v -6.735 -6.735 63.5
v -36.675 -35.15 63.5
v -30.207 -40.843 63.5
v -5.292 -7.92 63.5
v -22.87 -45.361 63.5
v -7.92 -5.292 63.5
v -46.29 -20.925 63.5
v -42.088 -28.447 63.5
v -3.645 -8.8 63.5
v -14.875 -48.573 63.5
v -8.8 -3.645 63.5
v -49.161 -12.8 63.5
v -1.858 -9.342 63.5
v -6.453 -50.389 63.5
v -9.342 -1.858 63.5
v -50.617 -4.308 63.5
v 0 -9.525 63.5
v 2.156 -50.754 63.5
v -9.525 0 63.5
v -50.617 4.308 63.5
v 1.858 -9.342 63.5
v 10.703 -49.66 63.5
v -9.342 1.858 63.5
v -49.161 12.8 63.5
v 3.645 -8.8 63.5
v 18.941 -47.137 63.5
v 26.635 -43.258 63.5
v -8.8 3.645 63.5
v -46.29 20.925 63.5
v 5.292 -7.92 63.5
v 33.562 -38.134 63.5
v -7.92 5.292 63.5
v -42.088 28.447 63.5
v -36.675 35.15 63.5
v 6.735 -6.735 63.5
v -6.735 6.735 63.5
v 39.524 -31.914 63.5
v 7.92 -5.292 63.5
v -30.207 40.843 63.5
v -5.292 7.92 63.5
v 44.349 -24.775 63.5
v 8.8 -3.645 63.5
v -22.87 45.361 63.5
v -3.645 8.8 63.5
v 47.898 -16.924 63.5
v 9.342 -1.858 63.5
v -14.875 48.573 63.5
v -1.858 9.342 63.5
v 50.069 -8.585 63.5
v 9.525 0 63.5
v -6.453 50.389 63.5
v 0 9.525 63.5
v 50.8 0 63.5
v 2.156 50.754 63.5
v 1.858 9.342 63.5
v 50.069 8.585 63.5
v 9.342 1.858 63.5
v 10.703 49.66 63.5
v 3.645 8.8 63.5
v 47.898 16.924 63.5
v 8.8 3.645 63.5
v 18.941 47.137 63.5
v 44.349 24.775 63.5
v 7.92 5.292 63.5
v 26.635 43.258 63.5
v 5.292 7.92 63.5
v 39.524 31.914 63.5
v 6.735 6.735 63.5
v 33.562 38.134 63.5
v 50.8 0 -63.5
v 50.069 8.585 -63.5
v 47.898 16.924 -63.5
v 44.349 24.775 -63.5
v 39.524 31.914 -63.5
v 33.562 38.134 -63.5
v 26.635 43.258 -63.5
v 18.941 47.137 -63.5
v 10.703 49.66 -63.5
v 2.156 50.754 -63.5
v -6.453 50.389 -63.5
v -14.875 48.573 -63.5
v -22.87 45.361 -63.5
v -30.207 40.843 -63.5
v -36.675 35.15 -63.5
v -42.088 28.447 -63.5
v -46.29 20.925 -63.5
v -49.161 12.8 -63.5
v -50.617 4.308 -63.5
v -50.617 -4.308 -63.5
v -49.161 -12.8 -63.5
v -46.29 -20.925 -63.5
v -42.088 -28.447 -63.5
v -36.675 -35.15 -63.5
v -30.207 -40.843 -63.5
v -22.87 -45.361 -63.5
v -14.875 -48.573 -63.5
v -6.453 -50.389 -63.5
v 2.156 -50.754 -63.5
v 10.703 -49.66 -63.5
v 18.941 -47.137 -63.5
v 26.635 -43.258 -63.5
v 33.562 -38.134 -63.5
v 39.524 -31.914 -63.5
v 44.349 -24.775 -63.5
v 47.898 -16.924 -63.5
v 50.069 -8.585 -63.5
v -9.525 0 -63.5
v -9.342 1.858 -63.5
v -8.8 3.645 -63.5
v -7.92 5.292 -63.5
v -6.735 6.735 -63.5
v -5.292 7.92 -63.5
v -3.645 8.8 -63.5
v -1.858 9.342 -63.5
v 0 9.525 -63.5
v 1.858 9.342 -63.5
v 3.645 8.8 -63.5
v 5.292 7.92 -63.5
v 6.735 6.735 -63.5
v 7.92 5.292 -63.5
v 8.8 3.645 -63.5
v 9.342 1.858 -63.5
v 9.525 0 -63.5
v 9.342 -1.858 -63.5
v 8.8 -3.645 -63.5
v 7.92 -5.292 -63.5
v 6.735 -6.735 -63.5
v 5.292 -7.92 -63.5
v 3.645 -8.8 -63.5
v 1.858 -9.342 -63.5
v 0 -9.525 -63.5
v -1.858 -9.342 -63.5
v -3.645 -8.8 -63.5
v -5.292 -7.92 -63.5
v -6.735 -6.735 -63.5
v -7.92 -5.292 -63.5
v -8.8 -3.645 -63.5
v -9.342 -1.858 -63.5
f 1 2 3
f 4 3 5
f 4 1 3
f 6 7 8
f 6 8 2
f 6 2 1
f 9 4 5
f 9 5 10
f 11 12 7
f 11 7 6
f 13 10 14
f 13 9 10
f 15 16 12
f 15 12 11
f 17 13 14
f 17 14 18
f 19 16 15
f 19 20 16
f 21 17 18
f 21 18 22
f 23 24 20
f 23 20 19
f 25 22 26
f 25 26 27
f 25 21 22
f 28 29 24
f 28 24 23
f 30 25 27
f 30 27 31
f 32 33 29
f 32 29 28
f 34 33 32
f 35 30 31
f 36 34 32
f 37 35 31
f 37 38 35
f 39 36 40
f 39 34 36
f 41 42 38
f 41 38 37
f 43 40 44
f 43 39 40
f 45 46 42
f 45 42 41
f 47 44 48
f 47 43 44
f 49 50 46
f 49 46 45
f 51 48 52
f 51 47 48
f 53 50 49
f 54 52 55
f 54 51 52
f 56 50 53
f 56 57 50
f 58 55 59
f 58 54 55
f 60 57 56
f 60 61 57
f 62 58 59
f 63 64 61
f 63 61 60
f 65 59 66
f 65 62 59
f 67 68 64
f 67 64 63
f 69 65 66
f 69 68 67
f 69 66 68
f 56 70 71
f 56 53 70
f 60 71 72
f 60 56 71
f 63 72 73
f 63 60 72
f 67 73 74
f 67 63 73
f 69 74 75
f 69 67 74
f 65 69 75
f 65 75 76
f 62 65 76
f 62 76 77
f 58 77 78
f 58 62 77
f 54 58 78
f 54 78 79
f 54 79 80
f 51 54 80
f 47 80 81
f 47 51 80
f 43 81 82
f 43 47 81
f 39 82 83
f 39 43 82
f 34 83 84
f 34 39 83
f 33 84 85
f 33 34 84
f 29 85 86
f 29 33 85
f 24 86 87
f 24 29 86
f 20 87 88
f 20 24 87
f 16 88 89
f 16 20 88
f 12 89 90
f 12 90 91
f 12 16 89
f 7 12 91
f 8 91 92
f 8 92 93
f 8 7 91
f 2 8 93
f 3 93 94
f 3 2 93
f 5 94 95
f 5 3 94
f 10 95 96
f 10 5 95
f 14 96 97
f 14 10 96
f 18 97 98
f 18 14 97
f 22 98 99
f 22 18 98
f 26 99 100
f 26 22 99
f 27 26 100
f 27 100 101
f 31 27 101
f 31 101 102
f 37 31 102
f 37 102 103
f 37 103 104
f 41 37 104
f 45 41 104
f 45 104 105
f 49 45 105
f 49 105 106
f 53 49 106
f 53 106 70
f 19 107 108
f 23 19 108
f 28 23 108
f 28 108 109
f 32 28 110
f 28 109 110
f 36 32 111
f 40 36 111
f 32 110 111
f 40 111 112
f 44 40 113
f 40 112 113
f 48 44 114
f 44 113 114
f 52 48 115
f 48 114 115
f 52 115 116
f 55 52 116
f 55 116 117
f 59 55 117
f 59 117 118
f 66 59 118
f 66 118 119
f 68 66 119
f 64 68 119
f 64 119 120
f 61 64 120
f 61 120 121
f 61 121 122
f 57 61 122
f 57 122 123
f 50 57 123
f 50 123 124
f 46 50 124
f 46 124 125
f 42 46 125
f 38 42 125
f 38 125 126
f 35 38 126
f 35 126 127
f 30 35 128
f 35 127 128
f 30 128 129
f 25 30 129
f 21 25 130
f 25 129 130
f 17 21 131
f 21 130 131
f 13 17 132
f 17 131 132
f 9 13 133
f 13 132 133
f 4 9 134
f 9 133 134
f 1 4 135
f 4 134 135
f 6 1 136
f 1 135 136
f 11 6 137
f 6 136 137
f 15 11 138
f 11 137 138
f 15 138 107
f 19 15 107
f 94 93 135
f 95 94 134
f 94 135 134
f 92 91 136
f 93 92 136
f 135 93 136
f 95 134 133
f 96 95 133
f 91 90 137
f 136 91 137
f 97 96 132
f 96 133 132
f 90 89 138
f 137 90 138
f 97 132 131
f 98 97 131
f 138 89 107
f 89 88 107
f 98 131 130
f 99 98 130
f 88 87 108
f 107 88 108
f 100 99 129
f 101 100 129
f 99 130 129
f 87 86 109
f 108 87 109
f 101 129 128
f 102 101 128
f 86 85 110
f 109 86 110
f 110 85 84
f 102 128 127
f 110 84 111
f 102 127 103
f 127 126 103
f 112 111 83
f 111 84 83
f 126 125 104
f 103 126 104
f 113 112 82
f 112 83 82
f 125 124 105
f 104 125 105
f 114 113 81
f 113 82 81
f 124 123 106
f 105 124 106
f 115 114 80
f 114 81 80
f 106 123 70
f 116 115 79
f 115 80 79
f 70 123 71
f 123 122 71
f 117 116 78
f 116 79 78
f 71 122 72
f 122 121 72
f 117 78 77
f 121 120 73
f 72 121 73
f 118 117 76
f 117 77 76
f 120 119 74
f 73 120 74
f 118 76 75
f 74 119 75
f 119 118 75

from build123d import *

# Parameters (mm, degrees)
F0_R     = 50.8
F1_DEPTH = 63.5
F2_D     = 19.05
F3_D     = 19.05


with BuildPart() as f1:
    # F0 (on Top) → F1 (new body, symmetric)
    with BuildSketch(Plane.XY):
        Circle(F0_R)
    extrude(amount=F1_DEPTH, both=True)

    # F2 (through all)
    with Locations(Plane.XY):
        with Locations((0, 0)):
            Hole(F2_D / 2)

    # F3 (through all)
    with Locations(Plane(origin=(0, 0, 0), x_dir=(1, 0, 0), z_dir=(0, 0, -1))):
        with Locations((0, 0)):
            Hole(F3_D / 2)


solid = f1.part
